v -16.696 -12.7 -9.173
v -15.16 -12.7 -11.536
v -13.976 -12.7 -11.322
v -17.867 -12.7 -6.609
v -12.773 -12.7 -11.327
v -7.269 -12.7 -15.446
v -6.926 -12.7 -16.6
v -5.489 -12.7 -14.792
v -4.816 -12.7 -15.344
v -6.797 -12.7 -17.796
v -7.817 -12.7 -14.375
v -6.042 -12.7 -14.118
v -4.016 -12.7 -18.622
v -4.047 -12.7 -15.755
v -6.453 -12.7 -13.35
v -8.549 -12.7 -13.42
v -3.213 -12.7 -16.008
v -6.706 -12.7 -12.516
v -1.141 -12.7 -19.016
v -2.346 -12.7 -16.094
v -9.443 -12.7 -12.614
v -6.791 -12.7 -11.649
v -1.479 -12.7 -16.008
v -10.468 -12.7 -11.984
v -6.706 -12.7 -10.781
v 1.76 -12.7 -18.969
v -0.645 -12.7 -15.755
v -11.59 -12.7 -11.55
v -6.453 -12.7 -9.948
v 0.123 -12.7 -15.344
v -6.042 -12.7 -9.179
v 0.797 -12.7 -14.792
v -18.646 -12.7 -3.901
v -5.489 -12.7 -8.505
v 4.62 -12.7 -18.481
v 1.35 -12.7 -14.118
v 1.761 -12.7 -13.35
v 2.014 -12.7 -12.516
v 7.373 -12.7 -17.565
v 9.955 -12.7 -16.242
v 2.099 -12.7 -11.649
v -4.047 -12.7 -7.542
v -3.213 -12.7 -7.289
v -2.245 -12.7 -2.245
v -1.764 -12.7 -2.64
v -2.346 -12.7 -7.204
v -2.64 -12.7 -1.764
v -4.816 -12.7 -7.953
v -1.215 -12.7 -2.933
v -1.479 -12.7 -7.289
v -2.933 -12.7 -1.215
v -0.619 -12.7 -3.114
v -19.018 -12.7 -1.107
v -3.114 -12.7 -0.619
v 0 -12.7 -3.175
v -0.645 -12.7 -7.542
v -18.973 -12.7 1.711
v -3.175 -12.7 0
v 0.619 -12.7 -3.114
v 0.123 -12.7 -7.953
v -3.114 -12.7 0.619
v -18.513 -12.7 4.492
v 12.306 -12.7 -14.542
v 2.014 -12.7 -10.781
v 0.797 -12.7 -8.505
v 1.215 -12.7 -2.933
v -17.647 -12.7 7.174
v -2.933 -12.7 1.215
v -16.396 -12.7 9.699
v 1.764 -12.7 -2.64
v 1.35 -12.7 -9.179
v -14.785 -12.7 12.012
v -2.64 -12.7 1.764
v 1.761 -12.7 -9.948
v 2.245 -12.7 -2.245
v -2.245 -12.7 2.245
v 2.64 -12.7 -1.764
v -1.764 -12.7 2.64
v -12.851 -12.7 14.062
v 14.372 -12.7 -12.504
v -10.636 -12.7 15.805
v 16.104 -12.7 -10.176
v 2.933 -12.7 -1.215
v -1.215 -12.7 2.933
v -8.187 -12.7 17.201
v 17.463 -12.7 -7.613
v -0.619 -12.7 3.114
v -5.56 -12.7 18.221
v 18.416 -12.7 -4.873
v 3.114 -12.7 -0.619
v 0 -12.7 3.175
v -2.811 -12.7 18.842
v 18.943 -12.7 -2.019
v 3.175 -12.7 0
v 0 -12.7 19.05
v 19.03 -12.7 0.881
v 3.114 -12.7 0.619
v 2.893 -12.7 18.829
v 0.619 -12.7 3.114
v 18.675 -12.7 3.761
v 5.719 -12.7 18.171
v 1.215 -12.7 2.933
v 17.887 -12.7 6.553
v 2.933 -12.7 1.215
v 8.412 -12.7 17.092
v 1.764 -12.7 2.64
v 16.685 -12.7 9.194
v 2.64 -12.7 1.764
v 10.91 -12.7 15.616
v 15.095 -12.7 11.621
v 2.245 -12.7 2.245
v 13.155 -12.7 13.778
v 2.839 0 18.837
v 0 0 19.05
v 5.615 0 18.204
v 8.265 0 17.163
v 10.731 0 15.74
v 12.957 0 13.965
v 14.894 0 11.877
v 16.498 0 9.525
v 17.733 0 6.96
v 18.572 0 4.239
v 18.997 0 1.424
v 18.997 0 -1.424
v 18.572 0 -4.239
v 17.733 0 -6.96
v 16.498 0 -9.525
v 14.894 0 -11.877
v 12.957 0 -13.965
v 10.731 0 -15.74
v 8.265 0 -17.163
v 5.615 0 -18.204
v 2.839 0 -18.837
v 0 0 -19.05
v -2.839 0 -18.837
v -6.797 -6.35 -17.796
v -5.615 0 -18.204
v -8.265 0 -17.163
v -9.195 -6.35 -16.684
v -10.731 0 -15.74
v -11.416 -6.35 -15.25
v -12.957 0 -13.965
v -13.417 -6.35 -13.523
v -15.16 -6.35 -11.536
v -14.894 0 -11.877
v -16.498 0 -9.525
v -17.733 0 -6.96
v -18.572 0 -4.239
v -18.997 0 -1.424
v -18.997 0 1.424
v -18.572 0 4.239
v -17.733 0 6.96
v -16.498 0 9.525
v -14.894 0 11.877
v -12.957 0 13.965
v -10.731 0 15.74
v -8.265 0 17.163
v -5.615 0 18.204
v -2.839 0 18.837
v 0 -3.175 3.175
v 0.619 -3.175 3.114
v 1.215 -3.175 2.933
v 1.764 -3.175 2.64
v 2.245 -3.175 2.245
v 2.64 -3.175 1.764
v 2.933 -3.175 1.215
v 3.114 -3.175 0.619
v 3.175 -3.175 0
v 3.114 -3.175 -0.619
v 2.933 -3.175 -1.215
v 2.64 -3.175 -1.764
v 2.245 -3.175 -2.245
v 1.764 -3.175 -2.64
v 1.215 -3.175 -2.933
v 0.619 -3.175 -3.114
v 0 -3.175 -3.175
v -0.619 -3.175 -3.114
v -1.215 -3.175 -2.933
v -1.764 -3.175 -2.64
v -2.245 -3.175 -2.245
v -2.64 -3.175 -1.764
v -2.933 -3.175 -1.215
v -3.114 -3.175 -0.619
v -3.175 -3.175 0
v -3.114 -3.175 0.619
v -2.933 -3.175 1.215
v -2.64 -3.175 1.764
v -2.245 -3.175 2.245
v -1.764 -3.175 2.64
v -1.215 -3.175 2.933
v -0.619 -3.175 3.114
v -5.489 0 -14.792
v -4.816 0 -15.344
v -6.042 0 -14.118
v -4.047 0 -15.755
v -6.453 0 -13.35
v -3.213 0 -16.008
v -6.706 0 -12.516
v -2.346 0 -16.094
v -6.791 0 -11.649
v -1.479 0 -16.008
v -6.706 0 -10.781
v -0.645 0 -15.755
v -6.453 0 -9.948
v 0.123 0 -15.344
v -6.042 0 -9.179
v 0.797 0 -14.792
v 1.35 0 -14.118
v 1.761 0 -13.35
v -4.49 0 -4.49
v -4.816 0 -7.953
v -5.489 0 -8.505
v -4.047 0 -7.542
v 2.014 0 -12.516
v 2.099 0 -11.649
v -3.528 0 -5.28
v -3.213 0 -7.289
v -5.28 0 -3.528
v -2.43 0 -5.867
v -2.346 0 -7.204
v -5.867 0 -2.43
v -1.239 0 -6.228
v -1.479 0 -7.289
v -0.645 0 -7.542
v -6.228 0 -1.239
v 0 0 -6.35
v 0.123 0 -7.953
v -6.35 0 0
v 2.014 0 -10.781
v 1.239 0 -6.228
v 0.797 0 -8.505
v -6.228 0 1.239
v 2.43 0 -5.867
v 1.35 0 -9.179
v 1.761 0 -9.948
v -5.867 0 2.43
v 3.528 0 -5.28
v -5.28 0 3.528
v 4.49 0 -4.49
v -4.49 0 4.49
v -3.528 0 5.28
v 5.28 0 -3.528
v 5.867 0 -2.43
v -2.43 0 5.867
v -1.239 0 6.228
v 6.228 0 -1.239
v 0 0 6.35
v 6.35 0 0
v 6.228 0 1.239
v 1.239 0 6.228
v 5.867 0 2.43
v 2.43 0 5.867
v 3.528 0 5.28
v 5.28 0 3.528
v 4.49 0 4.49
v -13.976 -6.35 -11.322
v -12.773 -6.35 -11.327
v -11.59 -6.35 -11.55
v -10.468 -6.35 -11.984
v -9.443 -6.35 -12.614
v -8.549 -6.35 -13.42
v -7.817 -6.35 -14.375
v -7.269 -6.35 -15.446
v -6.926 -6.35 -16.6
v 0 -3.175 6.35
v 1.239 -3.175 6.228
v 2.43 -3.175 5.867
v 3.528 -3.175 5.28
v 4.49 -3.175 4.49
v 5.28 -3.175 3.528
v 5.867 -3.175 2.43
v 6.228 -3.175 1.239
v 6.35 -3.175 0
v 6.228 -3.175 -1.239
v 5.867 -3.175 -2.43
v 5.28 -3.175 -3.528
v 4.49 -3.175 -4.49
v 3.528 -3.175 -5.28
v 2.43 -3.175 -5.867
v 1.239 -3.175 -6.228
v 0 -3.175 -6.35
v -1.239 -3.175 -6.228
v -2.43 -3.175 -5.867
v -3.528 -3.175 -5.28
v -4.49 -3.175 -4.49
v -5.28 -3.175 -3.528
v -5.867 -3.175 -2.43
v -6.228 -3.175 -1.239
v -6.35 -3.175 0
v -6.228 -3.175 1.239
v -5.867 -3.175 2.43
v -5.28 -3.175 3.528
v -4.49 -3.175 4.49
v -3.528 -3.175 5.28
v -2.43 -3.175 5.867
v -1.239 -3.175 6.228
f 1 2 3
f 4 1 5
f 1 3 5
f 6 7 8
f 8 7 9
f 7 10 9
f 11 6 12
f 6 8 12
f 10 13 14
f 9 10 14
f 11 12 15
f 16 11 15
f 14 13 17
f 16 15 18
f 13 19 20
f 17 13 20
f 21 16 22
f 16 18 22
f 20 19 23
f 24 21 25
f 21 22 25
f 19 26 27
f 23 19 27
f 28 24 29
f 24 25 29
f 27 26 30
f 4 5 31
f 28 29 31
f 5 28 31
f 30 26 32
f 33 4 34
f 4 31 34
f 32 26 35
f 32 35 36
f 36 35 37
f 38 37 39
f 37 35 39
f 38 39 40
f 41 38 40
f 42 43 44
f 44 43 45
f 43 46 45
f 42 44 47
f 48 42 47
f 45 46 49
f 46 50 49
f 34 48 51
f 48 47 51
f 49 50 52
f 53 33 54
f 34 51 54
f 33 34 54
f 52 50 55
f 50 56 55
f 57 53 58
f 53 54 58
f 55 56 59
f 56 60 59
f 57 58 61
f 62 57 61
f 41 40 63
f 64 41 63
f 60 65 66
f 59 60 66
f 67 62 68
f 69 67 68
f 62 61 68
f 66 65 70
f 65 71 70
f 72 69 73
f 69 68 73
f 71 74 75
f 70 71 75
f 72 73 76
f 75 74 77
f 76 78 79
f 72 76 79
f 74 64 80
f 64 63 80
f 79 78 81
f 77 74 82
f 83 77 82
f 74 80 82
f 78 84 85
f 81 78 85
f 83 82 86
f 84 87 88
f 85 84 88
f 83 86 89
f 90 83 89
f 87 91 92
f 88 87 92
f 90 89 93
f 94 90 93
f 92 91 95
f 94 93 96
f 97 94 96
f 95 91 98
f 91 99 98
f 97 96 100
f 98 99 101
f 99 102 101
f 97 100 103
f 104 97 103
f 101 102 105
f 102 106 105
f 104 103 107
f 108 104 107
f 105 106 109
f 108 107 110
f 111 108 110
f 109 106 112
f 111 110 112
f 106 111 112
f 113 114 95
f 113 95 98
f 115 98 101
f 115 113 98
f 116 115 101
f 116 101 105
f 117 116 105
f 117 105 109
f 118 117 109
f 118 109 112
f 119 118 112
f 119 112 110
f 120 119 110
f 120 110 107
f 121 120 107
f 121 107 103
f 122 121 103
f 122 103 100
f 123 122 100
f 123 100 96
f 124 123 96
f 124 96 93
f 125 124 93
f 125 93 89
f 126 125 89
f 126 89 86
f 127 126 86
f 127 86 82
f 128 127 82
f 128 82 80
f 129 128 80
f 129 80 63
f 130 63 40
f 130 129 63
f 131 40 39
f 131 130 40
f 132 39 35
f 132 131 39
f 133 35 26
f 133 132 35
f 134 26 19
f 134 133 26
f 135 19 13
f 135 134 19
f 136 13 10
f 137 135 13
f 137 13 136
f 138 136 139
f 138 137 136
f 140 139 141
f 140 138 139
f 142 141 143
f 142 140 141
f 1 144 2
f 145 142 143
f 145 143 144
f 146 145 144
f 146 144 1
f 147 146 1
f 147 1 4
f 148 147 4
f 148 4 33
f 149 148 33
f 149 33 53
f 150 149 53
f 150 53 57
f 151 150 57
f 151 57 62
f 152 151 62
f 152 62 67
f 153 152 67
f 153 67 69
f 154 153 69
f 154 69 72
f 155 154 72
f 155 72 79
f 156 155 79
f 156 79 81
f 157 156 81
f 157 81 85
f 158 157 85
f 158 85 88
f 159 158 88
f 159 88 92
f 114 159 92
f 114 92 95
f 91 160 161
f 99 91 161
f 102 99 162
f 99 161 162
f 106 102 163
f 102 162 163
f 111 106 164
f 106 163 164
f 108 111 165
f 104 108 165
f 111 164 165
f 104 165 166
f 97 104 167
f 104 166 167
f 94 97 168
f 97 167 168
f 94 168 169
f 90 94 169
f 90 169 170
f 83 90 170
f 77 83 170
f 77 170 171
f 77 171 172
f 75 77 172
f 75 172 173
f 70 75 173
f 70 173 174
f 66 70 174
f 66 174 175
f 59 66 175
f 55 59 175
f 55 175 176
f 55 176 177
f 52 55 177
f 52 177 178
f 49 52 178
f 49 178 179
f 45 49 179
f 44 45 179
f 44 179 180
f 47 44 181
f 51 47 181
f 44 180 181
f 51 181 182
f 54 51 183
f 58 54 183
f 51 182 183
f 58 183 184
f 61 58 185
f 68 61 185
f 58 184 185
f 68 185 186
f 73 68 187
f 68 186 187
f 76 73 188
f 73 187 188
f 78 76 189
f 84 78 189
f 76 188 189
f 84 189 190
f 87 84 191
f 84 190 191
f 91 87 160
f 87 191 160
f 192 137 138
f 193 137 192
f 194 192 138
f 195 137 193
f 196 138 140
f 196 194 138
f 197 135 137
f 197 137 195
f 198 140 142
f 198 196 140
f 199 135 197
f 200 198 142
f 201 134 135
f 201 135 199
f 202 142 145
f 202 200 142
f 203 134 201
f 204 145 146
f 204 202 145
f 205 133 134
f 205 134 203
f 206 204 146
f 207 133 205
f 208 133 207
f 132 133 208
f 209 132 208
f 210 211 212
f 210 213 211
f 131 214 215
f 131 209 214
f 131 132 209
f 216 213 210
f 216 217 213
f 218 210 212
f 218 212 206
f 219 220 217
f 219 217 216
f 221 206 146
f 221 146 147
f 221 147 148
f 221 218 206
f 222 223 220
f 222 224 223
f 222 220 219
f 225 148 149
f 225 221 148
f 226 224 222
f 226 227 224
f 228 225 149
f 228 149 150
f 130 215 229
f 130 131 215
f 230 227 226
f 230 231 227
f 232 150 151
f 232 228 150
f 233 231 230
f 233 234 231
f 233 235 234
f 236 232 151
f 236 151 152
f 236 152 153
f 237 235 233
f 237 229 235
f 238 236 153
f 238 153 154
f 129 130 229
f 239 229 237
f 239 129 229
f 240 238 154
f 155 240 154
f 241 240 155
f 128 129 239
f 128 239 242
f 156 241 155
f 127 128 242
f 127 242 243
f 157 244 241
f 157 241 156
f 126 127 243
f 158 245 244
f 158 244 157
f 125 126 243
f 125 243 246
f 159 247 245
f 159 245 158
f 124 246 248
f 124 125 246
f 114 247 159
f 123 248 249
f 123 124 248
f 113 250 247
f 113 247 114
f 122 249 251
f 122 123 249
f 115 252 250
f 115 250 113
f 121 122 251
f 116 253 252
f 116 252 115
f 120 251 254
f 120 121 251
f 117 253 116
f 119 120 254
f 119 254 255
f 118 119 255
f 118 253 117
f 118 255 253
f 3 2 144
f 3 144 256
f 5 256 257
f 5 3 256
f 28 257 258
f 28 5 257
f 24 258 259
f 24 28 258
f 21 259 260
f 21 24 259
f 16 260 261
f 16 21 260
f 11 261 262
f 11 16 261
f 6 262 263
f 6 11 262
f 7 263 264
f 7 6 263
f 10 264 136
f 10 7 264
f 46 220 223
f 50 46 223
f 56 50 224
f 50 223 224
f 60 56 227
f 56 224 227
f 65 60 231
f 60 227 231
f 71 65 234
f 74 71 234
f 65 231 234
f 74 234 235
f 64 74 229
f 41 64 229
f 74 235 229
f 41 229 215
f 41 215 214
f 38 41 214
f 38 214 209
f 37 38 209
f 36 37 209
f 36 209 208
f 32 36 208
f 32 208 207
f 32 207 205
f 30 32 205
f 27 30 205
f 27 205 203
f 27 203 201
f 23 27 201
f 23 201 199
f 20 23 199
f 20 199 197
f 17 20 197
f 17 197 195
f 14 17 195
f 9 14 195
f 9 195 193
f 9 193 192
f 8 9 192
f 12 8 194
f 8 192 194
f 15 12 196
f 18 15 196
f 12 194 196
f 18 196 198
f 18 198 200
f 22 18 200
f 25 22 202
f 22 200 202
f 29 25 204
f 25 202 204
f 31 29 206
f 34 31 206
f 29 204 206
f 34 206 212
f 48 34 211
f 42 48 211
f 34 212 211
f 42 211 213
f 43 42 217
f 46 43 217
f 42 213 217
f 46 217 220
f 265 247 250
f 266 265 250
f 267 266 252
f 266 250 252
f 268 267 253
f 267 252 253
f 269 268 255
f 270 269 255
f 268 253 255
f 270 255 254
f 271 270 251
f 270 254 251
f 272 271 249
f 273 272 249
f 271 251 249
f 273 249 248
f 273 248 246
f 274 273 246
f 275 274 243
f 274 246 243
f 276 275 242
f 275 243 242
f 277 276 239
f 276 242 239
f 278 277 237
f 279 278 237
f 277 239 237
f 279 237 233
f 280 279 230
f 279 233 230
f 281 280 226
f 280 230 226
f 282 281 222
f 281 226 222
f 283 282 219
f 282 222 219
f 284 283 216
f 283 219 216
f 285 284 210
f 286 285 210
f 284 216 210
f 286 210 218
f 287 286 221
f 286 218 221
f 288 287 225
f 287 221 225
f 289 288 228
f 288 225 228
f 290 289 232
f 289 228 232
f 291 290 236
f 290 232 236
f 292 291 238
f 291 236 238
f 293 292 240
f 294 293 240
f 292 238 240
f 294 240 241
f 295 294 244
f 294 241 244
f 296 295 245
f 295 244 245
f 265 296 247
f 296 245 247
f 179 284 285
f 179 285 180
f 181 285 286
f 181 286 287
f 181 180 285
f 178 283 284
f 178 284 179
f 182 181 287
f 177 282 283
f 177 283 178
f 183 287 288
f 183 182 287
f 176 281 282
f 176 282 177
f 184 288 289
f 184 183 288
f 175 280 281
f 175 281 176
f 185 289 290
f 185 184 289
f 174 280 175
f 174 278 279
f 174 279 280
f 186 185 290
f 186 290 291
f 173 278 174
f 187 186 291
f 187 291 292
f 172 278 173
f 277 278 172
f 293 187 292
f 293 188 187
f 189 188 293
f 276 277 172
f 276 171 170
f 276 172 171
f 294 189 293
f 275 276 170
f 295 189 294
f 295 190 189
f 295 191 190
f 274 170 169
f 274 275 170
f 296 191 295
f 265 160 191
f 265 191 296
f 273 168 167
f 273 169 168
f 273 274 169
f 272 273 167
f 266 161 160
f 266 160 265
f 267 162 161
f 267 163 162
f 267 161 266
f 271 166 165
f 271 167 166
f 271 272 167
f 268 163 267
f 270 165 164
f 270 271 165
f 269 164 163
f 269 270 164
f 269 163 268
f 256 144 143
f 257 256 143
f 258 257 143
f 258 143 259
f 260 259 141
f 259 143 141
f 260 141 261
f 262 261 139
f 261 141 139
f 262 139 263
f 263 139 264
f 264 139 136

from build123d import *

# Parameters (mm, degrees)
SKETCH1_R           = 19.05
BOSS_EXTRUDE1_DEPTH = 12.7
SKETCH2_R           = 3.175
CUT_EXTRUDE1_DEPTH  = 17.78
SKETCH3_R           = 6.35
CUT_EXTRUDE2_DEPTH  = 3.175
SKETCH4_R           = 4.445
CUT_EXTRUDE3_DEPTH  = 38.1
SKETCH5_R           = 6.604
CUT_EXTRUDE4_DEPTH  = 6.35


with BuildPart() as part:
    # Sketch1 → Boss-Extrude1 (new body)
    with BuildSketch(Plane(origin=(0, 0, 0), x_dir=(1, 0, 0), z_dir=(0, 1, 0))):
        with Locations(Location((0, 0, 0), (0, 0, 270))):
            Circle(SKETCH1_R)
    extrude(amount=-BOSS_EXTRUDE1_DEPTH)

    # Sketch2 → Cut-Extrude1 (cut)
    with BuildSketch(Plane(origin=(0, 0, 0), x_dir=(1, 0, 0), z_dir=(0, 1, 0))):
        with Locations(Location((0, 0, 0), (0, 0, 270))):
            Circle(SKETCH2_R)
    extrude(amount=-CUT_EXTRUDE1_DEPTH, mode=Mode.SUBTRACT)

    # Sketch3 → Cut-Extrude2 (cut)
    with BuildSketch(Plane(origin=(0, 0, 0), x_dir=(1, 0, 0), z_dir=(0, 1, 0))):
        with Locations(Location((0, 0, 0), (0, 0, 270))):
            Circle(SKETCH3_R)
    extrude(amount=-CUT_EXTRUDE2_DEPTH, mode=Mode.SUBTRACT)

    # Sketch4 → Cut-Extrude3 (cut)
    with BuildSketch(Plane(origin=(0, 0, 0), x_dir=(1, 0, 0), z_dir=(0, 1, 0))):
        with Locations(Location((-2.346030642, 11.648567038, 0), (0, 0, 270))):
            Circle(SKETCH4_R)
    extrude(amount=-CUT_EXTRUDE3_DEPTH, mode=Mode.SUBTRACT)

    # Sketch5 → Cut-Extrude4 (cut)
    with BuildSketch(Plane(origin=(0, -12.7, 0), x_dir=(1, 0, 0), z_dir=(0, 1, 0))):
        with Locations((-13.400281264, 17.901049998)):
            Circle(SKETCH5_R)
    extrude(amount=CUT_EXTRUDE4_DEPTH, mode=Mode.SUBTRACT)


solid = part.part
